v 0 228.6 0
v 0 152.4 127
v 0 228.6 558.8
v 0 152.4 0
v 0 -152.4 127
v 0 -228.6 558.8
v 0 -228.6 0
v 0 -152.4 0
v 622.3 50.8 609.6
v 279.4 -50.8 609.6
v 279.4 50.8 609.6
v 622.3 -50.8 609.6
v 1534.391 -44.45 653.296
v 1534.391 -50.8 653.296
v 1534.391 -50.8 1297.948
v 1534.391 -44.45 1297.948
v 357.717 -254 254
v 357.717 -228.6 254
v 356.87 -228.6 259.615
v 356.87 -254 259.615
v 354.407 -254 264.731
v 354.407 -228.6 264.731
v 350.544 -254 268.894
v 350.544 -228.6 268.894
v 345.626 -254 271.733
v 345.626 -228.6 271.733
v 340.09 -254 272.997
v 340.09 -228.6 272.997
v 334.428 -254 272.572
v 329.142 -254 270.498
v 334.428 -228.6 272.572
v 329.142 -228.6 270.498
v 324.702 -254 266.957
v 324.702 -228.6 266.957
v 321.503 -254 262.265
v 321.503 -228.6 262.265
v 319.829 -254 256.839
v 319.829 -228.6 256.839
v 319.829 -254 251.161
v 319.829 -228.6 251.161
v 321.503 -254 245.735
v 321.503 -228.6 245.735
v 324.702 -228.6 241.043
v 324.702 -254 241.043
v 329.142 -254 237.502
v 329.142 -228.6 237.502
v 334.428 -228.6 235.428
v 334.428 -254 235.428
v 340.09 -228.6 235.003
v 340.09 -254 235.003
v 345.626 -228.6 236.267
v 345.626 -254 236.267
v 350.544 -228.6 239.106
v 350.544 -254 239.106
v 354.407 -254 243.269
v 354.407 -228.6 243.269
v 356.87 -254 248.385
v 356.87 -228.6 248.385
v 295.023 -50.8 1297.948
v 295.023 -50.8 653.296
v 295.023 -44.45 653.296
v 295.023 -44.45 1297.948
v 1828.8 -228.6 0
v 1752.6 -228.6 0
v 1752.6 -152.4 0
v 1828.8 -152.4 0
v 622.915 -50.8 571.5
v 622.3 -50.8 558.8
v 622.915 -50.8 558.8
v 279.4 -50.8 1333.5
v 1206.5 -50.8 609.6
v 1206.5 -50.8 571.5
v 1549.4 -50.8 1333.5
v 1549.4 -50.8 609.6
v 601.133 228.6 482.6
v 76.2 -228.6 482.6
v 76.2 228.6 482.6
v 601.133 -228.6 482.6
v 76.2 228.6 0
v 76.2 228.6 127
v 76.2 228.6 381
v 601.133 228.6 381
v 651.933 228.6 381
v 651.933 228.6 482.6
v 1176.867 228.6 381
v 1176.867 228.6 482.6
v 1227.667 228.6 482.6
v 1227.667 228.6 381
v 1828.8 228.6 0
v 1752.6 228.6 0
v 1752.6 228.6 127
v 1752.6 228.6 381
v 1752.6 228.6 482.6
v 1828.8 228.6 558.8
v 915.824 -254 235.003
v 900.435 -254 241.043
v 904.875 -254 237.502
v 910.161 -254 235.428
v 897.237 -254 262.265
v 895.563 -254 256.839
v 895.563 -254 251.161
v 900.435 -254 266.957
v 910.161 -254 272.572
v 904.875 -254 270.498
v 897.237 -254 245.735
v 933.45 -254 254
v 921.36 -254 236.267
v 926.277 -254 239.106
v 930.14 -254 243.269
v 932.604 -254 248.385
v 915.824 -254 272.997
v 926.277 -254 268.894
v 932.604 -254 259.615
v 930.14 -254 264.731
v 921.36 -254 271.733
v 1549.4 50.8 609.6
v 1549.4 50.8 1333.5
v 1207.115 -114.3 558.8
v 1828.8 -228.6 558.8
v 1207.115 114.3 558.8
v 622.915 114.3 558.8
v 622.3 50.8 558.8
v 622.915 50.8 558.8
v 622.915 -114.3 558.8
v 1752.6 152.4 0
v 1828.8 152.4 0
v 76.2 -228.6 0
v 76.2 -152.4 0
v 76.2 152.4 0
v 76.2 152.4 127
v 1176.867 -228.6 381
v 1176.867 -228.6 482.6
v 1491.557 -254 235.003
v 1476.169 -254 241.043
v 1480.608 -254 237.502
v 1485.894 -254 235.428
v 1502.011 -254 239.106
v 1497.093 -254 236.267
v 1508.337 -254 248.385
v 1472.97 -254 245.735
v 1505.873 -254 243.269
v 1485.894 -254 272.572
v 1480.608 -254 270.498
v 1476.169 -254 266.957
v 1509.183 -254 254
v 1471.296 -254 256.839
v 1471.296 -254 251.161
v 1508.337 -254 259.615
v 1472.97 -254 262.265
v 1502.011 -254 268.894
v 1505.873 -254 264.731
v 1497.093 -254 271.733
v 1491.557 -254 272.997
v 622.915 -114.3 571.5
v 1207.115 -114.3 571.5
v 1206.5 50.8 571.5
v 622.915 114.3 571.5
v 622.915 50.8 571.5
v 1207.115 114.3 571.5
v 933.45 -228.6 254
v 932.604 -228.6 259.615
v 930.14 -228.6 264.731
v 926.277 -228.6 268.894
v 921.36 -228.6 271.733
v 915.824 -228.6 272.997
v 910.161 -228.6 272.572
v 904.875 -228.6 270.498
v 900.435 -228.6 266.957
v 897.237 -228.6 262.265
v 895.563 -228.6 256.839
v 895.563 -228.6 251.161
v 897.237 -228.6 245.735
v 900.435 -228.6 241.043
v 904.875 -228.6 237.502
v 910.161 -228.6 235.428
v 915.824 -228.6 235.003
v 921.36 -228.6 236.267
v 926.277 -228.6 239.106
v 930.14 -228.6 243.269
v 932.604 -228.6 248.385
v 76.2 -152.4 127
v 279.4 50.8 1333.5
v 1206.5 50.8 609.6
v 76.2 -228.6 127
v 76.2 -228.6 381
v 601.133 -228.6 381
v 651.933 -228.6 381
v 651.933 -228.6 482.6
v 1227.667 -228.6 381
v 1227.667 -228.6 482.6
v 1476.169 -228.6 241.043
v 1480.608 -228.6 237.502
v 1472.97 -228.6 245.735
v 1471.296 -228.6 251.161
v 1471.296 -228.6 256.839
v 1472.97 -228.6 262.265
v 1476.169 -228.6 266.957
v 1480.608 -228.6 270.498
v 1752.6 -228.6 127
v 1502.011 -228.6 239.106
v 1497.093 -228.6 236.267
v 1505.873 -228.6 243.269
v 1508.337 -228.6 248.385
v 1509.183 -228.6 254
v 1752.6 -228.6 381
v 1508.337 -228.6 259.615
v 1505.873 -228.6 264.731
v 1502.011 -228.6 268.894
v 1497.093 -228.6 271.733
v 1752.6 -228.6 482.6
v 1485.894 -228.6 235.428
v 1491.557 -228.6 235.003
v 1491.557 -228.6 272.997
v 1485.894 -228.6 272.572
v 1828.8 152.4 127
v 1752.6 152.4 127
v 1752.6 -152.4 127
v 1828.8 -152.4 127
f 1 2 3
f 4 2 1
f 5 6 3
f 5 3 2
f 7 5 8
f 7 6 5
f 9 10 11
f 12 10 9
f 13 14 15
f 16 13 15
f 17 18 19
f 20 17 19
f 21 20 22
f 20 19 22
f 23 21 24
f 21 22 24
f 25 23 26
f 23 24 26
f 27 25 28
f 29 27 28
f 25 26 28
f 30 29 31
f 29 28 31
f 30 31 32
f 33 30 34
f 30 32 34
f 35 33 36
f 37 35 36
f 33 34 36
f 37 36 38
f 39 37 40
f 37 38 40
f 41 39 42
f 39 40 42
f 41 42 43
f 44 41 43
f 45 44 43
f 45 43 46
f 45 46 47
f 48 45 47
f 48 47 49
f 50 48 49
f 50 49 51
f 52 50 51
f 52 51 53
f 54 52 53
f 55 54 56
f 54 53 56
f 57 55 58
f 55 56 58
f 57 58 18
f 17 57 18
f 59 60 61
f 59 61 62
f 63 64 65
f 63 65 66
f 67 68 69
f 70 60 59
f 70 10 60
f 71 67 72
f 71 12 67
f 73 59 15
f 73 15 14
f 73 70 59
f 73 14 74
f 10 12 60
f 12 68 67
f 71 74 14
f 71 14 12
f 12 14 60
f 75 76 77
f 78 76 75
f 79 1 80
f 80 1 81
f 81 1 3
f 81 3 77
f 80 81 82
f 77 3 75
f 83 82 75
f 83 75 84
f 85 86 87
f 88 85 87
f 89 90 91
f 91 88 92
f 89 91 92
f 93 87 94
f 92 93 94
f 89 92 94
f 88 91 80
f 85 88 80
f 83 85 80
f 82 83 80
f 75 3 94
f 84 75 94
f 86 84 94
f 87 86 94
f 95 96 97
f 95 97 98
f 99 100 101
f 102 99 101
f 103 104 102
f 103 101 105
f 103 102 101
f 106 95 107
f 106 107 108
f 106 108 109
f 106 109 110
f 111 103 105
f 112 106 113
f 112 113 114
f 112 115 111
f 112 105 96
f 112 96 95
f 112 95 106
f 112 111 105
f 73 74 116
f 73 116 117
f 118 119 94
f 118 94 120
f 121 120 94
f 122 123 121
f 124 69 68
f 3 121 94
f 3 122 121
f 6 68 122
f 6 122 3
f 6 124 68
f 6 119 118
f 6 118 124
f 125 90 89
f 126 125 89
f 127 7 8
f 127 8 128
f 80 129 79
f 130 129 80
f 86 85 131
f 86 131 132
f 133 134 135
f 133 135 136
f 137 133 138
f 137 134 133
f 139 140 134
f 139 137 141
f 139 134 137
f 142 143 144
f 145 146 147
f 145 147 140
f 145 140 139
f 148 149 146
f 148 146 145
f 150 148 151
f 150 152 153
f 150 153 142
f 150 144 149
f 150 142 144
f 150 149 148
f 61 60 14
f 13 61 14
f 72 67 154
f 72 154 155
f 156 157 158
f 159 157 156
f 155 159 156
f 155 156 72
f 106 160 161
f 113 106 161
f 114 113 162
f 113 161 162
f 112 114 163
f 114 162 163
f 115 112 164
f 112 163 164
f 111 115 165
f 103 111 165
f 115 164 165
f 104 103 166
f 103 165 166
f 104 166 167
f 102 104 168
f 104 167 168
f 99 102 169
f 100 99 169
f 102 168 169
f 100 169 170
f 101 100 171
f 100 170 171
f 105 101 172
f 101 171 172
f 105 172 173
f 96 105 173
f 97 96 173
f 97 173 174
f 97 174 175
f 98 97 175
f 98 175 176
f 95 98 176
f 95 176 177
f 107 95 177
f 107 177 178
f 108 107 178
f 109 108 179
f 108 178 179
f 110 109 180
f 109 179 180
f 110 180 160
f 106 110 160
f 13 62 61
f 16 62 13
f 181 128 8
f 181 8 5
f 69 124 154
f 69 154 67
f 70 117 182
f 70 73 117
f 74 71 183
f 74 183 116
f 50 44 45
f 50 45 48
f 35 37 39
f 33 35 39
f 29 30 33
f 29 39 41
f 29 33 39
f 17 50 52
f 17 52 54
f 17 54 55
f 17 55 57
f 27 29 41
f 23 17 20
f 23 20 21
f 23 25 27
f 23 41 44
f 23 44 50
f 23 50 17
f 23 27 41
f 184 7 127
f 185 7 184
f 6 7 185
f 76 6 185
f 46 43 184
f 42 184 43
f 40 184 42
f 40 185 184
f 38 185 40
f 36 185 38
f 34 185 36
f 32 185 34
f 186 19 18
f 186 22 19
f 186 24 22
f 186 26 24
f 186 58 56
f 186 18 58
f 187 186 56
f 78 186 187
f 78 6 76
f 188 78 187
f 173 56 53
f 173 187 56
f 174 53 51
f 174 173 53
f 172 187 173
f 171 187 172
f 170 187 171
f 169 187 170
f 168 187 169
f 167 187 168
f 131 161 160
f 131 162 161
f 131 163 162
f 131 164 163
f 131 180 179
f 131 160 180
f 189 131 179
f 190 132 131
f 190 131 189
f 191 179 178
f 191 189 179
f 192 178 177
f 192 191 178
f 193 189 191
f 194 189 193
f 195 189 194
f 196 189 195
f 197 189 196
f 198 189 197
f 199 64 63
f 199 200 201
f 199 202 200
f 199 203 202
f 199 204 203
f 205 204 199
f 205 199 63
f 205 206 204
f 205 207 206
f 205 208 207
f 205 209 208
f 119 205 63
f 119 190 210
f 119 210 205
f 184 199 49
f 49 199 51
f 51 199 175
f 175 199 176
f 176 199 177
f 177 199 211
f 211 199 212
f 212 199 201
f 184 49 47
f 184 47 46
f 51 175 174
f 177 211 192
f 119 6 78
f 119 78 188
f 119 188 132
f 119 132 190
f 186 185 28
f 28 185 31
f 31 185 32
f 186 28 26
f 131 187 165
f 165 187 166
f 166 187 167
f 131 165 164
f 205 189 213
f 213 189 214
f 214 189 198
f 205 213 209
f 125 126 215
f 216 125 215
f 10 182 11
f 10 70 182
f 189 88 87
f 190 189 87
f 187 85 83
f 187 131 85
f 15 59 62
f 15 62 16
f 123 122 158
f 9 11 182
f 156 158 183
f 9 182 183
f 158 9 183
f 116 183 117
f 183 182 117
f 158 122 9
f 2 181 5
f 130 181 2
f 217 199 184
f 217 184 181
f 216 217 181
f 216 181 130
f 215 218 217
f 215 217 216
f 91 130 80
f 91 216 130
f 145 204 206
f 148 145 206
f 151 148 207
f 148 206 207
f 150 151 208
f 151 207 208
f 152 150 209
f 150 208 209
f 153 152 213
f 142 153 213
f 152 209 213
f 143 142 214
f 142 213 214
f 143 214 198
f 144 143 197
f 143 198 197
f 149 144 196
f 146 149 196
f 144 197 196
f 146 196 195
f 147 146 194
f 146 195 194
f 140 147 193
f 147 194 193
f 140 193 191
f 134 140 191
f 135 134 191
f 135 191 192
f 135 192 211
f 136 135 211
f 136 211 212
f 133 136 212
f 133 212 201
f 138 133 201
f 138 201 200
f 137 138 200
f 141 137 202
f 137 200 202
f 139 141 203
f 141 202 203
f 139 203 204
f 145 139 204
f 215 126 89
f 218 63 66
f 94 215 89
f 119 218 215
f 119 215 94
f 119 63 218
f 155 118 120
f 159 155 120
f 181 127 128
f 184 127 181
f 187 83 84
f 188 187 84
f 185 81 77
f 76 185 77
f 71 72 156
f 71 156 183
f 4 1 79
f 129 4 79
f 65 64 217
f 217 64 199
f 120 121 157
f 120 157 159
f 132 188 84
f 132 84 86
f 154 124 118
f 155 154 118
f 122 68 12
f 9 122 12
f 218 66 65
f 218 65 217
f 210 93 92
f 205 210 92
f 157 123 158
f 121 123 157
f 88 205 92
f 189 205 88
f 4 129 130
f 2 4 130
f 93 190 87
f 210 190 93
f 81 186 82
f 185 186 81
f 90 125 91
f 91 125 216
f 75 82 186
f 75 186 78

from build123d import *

# Parameters (mm, degrees)
F0_W      = 76.2
F0_H      = 127
F0_W_2    = 50.8
F0_H_2    = 101.6
F1_DEPTH  = 228.6
F2_W      = 304.8
F2_H      = 127
F3_DEPTH  = 1828.801
F0_W_3    = 584.2
F0_H_3    = 50.8
F4_DEPTH  = 50.8
F5_W      = 584.2
F5_H      = 228.6
F6_DEPTH  = 12.7
F7_R      = 19.05
F8_DEPTH  = 25.4
F9_W      = 1239.3679447479
F9_H      = 644.6519196678
F10_DEPTH = 6.35


with BuildPart() as f1:
    # F0 (on Front) → F1 (new body, symmetric)
    with BuildSketch(Plane.XZ):
        Polygon((0, 558.8), (0, 127), (76.2, 127), (1752.6, 127), (1828.8, 127), (1828.8, 558.8), (1206.5, 558.8), (622.3, 558.8), align=None)
        Polygon((76.2, 381), (76.2, 482.6), (601.1333333333, 482.6), (651.9333333333, 482.6), (1176.8666666667, 482.6), (1227.6666666667, 482.6), (1752.6, 482.6), (1752.6, 381), (1227.6666666667, 381), (1176.8666666667, 381), (651.9333333333, 381), (601.1333333333, 381), align=None, mode=Mode.SUBTRACT)
        with Locations((38.1, 63.5)):
            Rectangle(F0_W, F0_H)
        with Locations((1790.7, 63.5)):
            Rectangle(F0_W, F0_H)
        with Locations((626.5333333333, 431.8)):
            Rectangle(F0_W_2, F0_H_2)
        with Locations((1202.2666666667, 431.8)):
            Rectangle(F0_W_2, F0_H_2)
    extrude(amount=F1_DEPTH, both=True)

    # F2 (on face) → F3 (cut, through all)
    with BuildSketch(Plane.YZ.offset(1828.8)):
        with Locations((0, 63.5)):
            Rectangle(F2_W, F2_H)
    extrude(amount=-F3_DEPTH, mode=Mode.SUBTRACT)

    # F0 (on Front) → F4 (join, symmetric)
    with BuildSketch(Plane.XZ):
        Polygon((279.4, 609.6), (622.3, 609.6), (1206.5, 609.6), (1549.4, 609.6), (1549.4, 1333.5), (279.4, 1333.5), align=None)
        with Locations((914.4, 584.2)):
            Rectangle(F0_W_3, F0_H_3)
    extrude(amount=F4_DEPTH, both=True)

    # F5 (on face) → F6 (join)
    with BuildSketch(Plane.XY.offset(558.8)):
        with Locations((915.0145053864, 0)):
            Rectangle(F5_W, F5_H)
    extrude(amount=F6_DEPTH)

    # F7 (on face) → F8 (join)
    with BuildSketch(Plane.XZ.offset(228.6)):
        with Locations((338.6666666667, 254)):
            Circle(F7_R)
        with Locations((914.4, 254)):
            Circle(F7_R)
        with Locations((1490.1333333333, 254)):
            Circle(F7_R)
    extrude(amount=F8_DEPTH)

    # F9 (on face) → F10 (cut)
    with BuildSketch(Plane.XZ.offset(50.8)):
        with Locations((914.7072526932, 975.6220156918)):
            Rectangle(F9_W, F9_H)
    extrude(amount=-F10_DEPTH, mode=Mode.SUBTRACT)


solid = f1.part
